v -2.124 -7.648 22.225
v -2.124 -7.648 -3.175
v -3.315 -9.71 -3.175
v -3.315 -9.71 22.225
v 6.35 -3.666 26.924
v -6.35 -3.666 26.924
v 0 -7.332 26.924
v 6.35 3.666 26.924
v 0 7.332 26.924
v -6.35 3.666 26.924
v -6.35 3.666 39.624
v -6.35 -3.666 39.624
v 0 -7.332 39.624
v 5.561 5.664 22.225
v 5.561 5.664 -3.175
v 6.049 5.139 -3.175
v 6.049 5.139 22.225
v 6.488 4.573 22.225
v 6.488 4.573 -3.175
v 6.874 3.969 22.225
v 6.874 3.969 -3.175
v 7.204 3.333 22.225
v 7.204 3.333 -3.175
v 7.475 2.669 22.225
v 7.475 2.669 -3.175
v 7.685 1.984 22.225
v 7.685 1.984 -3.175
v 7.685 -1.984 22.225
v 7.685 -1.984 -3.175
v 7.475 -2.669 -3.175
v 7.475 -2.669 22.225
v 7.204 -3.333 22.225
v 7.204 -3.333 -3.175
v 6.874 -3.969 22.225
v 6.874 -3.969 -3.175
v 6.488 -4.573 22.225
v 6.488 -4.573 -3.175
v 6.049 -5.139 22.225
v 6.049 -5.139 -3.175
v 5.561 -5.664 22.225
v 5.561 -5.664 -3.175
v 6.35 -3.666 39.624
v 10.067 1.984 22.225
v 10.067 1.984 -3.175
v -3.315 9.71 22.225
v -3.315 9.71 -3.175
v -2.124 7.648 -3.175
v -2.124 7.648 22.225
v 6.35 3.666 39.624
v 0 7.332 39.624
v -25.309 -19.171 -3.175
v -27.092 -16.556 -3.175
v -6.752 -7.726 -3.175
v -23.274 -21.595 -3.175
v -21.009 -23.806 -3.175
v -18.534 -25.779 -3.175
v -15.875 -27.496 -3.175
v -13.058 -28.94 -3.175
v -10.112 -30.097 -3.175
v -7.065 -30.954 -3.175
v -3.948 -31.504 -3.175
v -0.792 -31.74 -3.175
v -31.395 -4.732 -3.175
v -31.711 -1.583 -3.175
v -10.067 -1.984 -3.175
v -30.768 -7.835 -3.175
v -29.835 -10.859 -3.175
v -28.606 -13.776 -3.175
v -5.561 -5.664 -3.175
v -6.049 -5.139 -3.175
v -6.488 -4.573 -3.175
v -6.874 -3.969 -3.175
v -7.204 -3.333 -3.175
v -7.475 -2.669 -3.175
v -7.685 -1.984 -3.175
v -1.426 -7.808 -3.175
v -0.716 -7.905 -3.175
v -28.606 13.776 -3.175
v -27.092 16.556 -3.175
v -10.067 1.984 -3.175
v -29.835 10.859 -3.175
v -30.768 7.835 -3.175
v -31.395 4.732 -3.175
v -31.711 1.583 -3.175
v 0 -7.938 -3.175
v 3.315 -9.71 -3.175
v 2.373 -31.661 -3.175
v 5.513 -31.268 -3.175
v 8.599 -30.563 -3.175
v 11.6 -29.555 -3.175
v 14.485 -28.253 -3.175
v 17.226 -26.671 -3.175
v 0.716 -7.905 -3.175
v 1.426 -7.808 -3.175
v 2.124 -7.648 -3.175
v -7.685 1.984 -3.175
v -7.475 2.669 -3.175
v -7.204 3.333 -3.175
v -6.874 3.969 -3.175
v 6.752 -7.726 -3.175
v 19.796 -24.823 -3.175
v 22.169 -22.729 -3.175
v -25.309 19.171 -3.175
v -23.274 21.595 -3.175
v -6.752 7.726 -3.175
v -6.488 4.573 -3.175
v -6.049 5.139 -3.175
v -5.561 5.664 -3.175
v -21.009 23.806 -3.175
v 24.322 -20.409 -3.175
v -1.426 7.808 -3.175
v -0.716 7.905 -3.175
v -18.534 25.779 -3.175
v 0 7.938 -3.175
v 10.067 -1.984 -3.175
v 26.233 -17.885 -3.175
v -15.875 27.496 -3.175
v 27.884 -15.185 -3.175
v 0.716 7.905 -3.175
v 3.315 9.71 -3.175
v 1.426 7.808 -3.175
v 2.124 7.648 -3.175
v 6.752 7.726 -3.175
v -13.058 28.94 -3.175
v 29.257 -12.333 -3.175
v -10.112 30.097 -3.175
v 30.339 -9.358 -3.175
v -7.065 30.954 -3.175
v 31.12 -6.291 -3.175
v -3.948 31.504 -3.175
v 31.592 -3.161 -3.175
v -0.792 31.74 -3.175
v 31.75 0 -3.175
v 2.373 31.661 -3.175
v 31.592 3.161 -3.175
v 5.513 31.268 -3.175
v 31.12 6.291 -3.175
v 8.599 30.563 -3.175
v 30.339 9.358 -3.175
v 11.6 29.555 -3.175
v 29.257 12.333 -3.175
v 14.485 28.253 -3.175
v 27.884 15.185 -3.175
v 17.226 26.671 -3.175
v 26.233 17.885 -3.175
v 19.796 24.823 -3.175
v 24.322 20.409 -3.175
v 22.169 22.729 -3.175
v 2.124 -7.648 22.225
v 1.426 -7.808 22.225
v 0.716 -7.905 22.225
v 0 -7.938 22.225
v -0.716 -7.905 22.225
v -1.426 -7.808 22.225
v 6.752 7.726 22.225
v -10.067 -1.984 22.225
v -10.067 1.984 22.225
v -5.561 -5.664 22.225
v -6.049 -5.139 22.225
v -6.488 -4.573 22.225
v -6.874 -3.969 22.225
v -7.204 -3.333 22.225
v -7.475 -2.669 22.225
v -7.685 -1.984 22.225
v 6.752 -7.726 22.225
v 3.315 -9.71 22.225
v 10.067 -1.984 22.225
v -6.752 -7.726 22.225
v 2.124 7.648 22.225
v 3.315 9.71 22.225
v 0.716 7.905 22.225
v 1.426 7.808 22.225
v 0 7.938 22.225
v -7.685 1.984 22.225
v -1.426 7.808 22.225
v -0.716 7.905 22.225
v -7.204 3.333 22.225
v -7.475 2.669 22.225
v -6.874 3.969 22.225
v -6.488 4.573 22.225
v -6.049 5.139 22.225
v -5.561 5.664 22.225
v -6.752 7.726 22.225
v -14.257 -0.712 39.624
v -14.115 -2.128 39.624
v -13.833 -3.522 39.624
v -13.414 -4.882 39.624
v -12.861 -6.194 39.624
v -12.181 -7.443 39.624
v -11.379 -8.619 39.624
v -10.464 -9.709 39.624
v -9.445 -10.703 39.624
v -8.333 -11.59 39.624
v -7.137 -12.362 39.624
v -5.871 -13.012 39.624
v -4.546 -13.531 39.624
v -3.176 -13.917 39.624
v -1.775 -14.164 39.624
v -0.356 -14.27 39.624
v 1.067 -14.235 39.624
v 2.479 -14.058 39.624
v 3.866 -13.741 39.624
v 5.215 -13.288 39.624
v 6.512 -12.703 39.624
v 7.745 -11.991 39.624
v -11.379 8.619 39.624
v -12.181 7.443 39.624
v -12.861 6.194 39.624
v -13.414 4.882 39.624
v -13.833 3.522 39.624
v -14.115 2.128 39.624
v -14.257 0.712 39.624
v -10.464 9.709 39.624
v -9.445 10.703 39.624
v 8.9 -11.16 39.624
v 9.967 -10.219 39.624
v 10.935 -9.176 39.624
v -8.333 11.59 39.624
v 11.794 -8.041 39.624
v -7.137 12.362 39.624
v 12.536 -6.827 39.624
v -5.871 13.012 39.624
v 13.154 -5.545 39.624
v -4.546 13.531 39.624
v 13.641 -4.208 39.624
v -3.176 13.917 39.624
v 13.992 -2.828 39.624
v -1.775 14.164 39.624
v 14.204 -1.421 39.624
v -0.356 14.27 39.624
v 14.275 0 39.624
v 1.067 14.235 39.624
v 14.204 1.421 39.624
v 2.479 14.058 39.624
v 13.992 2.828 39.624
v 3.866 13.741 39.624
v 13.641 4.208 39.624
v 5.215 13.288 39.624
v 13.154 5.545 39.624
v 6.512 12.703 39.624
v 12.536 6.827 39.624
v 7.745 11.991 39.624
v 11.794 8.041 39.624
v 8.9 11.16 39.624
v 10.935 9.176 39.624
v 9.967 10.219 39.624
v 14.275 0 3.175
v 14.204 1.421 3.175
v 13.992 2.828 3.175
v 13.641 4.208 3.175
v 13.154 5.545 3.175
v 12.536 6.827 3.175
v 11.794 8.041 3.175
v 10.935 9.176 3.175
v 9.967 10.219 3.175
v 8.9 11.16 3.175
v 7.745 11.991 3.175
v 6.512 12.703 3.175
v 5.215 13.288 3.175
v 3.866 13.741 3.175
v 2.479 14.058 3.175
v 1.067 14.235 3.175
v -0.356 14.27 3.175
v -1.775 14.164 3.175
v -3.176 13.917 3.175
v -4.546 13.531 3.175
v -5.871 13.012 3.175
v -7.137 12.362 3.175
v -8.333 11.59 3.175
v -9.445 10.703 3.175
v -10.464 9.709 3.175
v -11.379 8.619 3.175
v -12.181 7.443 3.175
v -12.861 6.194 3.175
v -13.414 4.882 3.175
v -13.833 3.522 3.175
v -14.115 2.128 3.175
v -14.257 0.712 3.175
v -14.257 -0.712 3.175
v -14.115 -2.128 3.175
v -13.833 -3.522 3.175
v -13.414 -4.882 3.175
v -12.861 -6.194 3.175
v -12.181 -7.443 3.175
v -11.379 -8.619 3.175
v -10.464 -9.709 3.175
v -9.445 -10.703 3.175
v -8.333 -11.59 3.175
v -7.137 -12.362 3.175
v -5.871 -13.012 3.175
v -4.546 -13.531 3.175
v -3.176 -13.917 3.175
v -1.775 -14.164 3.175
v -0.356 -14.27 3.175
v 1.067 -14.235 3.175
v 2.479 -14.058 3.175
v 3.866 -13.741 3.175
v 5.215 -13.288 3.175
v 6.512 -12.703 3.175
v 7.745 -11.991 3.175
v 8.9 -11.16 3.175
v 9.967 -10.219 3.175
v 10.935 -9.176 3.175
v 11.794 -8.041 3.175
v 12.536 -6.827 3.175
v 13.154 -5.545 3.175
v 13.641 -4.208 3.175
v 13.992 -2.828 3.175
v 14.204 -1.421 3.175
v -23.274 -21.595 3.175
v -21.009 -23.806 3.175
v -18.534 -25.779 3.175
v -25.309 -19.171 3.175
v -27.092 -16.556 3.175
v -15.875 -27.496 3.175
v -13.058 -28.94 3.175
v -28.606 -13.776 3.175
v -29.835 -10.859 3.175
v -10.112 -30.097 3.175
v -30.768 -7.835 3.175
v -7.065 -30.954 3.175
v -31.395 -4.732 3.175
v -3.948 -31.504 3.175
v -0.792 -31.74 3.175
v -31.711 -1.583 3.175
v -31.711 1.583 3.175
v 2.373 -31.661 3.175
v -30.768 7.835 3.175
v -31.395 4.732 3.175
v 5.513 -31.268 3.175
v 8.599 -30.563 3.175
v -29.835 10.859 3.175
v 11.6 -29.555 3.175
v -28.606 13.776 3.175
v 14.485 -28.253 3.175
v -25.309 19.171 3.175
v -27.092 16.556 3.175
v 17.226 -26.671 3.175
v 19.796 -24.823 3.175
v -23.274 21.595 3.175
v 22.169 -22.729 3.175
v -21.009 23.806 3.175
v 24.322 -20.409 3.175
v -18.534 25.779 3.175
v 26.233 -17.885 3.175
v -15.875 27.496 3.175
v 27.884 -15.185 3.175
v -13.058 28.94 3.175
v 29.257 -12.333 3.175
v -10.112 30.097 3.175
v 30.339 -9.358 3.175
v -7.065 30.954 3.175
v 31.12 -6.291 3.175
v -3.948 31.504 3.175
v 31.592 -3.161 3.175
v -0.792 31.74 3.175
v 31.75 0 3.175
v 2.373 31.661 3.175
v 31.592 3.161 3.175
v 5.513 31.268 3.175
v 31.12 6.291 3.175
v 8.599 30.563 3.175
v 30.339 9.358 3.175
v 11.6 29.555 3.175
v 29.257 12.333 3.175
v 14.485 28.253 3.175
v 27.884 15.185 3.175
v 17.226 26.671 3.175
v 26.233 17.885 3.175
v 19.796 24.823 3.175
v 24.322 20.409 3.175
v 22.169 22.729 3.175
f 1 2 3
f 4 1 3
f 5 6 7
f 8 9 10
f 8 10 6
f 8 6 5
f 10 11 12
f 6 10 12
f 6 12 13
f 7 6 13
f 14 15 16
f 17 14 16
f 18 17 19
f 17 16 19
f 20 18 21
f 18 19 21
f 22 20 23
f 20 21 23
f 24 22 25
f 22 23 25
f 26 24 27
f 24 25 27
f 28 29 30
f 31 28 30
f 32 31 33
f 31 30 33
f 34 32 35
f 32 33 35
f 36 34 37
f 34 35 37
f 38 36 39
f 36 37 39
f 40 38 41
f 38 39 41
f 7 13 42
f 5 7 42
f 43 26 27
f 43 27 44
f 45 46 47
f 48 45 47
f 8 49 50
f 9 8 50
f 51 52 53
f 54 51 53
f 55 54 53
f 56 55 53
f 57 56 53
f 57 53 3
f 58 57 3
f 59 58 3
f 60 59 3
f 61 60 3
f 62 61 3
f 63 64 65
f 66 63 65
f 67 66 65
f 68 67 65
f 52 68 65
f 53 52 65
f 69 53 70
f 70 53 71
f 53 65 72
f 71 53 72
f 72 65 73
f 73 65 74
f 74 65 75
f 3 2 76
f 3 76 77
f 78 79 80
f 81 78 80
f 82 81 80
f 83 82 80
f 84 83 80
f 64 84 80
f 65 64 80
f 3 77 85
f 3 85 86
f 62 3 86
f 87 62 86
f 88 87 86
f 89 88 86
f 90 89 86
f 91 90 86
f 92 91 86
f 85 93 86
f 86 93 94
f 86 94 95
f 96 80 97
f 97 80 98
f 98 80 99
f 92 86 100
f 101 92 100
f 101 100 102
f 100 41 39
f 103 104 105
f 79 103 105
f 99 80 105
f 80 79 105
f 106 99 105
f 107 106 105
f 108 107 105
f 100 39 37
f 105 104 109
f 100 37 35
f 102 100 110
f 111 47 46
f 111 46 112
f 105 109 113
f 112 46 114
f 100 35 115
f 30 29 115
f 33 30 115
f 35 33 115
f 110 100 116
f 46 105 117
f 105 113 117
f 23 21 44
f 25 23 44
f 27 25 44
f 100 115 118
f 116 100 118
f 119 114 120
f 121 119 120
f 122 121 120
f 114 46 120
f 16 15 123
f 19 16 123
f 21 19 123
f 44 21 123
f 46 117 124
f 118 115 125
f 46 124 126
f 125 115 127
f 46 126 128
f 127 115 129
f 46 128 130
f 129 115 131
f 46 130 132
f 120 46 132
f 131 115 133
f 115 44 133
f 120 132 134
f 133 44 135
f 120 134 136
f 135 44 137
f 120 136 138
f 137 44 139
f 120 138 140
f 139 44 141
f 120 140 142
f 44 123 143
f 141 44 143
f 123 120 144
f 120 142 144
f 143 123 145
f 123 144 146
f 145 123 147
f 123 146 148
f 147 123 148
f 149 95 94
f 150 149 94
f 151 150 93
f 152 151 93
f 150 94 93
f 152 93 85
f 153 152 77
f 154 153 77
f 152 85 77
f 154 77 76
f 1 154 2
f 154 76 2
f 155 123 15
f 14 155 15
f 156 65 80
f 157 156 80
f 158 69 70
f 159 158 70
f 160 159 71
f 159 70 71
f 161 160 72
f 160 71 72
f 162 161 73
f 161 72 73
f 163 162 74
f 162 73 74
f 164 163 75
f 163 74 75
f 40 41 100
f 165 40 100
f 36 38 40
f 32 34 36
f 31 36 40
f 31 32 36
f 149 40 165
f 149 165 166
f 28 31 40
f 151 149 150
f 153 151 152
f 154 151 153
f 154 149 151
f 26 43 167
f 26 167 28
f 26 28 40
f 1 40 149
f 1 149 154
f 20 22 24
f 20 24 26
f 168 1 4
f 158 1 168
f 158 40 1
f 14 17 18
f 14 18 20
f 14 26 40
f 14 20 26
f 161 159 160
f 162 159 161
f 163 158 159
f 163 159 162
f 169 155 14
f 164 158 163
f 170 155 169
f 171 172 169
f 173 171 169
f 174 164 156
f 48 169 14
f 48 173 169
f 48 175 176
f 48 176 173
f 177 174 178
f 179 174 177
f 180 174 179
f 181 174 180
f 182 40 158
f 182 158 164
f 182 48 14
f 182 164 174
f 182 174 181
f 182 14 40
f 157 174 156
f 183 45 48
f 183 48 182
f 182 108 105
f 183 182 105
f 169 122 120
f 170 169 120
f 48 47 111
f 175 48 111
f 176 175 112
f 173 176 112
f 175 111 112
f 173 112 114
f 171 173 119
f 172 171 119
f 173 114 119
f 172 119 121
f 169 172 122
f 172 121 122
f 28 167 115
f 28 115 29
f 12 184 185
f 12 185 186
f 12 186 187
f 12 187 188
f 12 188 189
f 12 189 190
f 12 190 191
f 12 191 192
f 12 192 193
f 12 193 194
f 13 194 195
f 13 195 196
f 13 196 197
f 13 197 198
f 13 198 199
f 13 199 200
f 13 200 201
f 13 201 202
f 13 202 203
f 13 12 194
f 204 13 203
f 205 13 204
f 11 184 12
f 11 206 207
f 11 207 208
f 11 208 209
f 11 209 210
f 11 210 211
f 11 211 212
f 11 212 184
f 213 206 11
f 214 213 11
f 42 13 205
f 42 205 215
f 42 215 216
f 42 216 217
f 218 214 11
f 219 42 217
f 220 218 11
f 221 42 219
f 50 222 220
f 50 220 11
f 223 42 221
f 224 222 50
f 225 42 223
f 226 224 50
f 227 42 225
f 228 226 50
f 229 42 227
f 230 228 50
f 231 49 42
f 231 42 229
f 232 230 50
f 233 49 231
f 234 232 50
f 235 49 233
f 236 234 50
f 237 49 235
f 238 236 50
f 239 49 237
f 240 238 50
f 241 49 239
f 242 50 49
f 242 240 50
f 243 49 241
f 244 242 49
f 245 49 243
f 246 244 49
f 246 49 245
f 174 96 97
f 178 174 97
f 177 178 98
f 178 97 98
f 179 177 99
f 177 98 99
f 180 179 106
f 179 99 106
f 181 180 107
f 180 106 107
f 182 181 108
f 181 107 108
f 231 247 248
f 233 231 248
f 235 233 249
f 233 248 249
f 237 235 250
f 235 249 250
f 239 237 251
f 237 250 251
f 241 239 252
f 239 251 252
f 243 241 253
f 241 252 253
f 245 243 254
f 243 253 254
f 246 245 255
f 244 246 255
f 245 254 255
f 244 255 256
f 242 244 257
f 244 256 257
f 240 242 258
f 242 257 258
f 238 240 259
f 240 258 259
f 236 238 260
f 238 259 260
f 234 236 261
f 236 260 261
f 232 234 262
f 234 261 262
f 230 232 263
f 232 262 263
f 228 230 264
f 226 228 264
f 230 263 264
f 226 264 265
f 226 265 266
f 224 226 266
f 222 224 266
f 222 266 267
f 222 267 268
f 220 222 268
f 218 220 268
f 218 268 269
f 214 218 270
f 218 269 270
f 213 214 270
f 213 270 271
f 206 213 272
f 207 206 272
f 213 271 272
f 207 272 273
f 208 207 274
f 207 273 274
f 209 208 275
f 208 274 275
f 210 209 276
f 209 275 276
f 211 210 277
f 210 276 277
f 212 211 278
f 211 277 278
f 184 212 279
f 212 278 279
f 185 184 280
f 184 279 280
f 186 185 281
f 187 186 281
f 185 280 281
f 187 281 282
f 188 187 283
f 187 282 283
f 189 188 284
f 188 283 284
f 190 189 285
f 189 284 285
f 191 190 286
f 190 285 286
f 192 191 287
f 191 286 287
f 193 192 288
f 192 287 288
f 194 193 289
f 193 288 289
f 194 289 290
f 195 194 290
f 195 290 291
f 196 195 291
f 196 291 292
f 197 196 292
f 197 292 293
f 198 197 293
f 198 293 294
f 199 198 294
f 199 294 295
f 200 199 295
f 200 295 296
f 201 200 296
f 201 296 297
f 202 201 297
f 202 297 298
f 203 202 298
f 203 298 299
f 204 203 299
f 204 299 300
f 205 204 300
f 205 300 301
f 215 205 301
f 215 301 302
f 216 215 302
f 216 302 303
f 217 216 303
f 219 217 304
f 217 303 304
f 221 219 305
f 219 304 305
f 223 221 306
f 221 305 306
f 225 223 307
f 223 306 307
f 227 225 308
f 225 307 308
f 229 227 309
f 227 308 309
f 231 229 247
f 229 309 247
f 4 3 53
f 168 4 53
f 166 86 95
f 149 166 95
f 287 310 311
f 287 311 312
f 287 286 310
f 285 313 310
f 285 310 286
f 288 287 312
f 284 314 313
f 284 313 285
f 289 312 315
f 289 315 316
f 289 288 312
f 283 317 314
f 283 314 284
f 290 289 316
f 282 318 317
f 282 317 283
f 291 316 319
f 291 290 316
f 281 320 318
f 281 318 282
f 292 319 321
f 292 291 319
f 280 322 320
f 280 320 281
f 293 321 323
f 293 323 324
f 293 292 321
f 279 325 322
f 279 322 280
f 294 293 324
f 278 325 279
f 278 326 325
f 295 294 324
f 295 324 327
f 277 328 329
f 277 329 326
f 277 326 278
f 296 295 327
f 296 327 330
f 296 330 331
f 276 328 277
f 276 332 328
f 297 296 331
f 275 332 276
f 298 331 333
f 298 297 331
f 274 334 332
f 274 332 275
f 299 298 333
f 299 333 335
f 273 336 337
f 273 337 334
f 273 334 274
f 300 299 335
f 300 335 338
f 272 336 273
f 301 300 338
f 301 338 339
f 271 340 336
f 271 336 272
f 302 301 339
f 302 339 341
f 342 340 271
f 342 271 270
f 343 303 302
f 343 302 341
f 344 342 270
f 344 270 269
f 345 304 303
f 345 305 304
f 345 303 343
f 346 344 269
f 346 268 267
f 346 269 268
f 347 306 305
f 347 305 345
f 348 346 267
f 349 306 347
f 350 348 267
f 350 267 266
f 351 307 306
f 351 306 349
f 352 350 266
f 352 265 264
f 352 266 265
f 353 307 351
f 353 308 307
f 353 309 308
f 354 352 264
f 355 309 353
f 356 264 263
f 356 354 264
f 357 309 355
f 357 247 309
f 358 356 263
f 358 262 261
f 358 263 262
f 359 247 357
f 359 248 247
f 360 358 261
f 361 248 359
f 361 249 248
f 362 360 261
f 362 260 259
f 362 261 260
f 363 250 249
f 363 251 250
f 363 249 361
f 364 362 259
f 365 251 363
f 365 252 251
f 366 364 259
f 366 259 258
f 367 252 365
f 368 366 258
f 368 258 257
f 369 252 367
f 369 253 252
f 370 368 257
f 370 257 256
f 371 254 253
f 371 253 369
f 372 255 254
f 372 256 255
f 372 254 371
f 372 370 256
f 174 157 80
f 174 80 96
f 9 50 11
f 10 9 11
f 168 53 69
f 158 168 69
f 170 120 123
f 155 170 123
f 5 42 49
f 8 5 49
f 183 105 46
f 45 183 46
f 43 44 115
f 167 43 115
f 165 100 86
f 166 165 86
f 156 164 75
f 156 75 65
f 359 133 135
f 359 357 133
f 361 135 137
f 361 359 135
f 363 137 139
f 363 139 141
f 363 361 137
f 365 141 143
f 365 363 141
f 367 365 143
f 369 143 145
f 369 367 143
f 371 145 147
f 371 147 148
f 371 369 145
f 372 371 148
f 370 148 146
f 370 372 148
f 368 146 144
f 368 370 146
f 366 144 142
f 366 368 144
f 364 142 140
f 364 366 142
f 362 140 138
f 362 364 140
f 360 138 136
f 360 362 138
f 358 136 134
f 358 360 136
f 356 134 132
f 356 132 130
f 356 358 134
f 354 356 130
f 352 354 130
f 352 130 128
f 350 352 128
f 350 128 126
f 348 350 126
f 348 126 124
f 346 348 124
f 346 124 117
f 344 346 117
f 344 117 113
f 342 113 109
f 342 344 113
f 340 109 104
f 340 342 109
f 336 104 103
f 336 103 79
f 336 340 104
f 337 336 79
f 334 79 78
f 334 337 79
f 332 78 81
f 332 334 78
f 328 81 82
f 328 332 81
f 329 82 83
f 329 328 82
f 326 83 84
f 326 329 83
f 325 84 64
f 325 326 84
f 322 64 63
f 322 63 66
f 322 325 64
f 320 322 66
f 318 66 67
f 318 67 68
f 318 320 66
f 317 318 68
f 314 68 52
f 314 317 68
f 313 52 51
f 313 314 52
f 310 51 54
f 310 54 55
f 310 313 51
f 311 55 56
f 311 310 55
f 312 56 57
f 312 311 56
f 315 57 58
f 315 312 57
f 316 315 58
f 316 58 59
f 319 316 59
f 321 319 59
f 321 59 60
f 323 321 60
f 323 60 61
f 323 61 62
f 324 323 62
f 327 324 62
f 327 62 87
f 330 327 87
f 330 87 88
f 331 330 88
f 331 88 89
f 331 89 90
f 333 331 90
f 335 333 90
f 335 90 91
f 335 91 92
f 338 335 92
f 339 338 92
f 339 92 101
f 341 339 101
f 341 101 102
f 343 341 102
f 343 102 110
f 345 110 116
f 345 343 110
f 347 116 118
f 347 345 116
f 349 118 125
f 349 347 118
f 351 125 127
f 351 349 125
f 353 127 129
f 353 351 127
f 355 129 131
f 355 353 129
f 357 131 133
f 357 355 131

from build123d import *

# Parameters (mm, degrees)
SKETCH1_R           = 31.75
BOSS_EXTRUDE1_DEPTH = 3.175
SKETCH2_R           = 14.2748
BOSS_EXTRUDE2_DEPTH = 36.449
CUT_EXTRUDE1_DEPTH  = 25.4
CUT_EXTRUDE2_DEPTH  = 12.7


with BuildPart() as part:
    # Sketch1 → Boss-Extrude1 (new, symmetric)
    with BuildSketch(Plane.XY):
        Circle(SKETCH1_R)
    extrude(amount=BOSS_EXTRUDE1_DEPTH, both=True)

    # Sketch2 → Boss-Extrude2 (add)
    with BuildSketch(Plane.XY.offset(3.175)):
        Circle(SKETCH2_R)
    extrude(amount=BOSS_EXTRUDE2_DEPTH)

    # Sketch3 → Cut-Extrude1 (cut)
    with BuildSketch(Plane(origin=(0, 0, -3.175), x_dir=(-1, 0, 0), z_dir=(0, 0, -1))):
        with BuildLine():
            Line((-10.066701328, 1.984375), (-10.066701328, -1.984375))
            Line((-10.066701328, -1.984375), (-7.685451328, -1.984375))
            ThreePointArc((-7.685451328, -1.984375), (-6.874076643, -3.96875), (-5.561244824, -5.663608589))
            Line((-5.561244824, -5.663608589), (-6.751869824, -7.725831582))
            Line((-6.751869824, -7.725831582), (-3.314831503, -9.710206582))
            Line((-3.314831503, -9.710206582), (-2.124206503, -7.647983589))
            ThreePointArc((-2.124206503, -7.647983589), (0, -7.9375), (2.124206503, -7.647983589))
            Line((2.124206503, -7.647983589), (3.314831503, -9.710206582))
            Line((3.314831503, -9.710206582), (6.751869824, -7.725831582))
            Line((6.751869824, -7.725831582), (5.561244824, -5.663608589))
            ThreePointArc((5.561244824, -5.663608589), (6.874076643, -3.96875), (7.685451328, -1.984375))
            Line((7.685451328, -1.984375), (10.066701328, -1.984375))
            Line((10.066701328, -1.984375), (10.066701328, 1.984375))
            Line((10.066701328, 1.984375), (7.685451328, 1.984375))
            ThreePointArc((7.685451328, 1.984375), (6.874076643, 3.96875), (5.561244824, 5.663608589))
            Line((5.561244824, 5.663608589), (6.751869824, 7.725831582))
            Line((6.751869824, 7.725831582), (3.314831503, 9.710206582))
            Line((3.314831503, 9.710206582), (2.124206503, 7.647983589))
            ThreePointArc((2.124206503, 7.647983589), (0, 7.9375), (-2.124206503, 7.647983589))
            Line((-2.124206503, 7.647983589), (-3.314831503, 9.710206582))
            Line((-3.314831503, 9.710206582), (-6.751869824, 7.725831582))
            Line((-6.751869824, 7.725831582), (-5.561244824, 5.663608589))
            ThreePointArc((-5.561244824, 5.663608589), (-6.874076643, 3.96875), (-7.685451328, 1.984375))
            Line((-7.685451328, 1.984375), (-10.066701328, 1.984375))
        make_face()
    extrude(amount=-CUT_EXTRUDE1_DEPTH, mode=Mode.SUBTRACT)

    # Sketch4 → Cut-Extrude2 (cut)
    with BuildSketch(Plane.XY.offset(39.624)):
        Polygon((0, 7.332348419), (-6.35, 3.666174209), (-6.35, -3.666174209), (0, -7.332348419), (6.35, -3.666174209), (6.35, 3.666174209), align=None)
    extrude(amount=-CUT_EXTRUDE2_DEPTH, mode=Mode.SUBTRACT)


solid = part.part
